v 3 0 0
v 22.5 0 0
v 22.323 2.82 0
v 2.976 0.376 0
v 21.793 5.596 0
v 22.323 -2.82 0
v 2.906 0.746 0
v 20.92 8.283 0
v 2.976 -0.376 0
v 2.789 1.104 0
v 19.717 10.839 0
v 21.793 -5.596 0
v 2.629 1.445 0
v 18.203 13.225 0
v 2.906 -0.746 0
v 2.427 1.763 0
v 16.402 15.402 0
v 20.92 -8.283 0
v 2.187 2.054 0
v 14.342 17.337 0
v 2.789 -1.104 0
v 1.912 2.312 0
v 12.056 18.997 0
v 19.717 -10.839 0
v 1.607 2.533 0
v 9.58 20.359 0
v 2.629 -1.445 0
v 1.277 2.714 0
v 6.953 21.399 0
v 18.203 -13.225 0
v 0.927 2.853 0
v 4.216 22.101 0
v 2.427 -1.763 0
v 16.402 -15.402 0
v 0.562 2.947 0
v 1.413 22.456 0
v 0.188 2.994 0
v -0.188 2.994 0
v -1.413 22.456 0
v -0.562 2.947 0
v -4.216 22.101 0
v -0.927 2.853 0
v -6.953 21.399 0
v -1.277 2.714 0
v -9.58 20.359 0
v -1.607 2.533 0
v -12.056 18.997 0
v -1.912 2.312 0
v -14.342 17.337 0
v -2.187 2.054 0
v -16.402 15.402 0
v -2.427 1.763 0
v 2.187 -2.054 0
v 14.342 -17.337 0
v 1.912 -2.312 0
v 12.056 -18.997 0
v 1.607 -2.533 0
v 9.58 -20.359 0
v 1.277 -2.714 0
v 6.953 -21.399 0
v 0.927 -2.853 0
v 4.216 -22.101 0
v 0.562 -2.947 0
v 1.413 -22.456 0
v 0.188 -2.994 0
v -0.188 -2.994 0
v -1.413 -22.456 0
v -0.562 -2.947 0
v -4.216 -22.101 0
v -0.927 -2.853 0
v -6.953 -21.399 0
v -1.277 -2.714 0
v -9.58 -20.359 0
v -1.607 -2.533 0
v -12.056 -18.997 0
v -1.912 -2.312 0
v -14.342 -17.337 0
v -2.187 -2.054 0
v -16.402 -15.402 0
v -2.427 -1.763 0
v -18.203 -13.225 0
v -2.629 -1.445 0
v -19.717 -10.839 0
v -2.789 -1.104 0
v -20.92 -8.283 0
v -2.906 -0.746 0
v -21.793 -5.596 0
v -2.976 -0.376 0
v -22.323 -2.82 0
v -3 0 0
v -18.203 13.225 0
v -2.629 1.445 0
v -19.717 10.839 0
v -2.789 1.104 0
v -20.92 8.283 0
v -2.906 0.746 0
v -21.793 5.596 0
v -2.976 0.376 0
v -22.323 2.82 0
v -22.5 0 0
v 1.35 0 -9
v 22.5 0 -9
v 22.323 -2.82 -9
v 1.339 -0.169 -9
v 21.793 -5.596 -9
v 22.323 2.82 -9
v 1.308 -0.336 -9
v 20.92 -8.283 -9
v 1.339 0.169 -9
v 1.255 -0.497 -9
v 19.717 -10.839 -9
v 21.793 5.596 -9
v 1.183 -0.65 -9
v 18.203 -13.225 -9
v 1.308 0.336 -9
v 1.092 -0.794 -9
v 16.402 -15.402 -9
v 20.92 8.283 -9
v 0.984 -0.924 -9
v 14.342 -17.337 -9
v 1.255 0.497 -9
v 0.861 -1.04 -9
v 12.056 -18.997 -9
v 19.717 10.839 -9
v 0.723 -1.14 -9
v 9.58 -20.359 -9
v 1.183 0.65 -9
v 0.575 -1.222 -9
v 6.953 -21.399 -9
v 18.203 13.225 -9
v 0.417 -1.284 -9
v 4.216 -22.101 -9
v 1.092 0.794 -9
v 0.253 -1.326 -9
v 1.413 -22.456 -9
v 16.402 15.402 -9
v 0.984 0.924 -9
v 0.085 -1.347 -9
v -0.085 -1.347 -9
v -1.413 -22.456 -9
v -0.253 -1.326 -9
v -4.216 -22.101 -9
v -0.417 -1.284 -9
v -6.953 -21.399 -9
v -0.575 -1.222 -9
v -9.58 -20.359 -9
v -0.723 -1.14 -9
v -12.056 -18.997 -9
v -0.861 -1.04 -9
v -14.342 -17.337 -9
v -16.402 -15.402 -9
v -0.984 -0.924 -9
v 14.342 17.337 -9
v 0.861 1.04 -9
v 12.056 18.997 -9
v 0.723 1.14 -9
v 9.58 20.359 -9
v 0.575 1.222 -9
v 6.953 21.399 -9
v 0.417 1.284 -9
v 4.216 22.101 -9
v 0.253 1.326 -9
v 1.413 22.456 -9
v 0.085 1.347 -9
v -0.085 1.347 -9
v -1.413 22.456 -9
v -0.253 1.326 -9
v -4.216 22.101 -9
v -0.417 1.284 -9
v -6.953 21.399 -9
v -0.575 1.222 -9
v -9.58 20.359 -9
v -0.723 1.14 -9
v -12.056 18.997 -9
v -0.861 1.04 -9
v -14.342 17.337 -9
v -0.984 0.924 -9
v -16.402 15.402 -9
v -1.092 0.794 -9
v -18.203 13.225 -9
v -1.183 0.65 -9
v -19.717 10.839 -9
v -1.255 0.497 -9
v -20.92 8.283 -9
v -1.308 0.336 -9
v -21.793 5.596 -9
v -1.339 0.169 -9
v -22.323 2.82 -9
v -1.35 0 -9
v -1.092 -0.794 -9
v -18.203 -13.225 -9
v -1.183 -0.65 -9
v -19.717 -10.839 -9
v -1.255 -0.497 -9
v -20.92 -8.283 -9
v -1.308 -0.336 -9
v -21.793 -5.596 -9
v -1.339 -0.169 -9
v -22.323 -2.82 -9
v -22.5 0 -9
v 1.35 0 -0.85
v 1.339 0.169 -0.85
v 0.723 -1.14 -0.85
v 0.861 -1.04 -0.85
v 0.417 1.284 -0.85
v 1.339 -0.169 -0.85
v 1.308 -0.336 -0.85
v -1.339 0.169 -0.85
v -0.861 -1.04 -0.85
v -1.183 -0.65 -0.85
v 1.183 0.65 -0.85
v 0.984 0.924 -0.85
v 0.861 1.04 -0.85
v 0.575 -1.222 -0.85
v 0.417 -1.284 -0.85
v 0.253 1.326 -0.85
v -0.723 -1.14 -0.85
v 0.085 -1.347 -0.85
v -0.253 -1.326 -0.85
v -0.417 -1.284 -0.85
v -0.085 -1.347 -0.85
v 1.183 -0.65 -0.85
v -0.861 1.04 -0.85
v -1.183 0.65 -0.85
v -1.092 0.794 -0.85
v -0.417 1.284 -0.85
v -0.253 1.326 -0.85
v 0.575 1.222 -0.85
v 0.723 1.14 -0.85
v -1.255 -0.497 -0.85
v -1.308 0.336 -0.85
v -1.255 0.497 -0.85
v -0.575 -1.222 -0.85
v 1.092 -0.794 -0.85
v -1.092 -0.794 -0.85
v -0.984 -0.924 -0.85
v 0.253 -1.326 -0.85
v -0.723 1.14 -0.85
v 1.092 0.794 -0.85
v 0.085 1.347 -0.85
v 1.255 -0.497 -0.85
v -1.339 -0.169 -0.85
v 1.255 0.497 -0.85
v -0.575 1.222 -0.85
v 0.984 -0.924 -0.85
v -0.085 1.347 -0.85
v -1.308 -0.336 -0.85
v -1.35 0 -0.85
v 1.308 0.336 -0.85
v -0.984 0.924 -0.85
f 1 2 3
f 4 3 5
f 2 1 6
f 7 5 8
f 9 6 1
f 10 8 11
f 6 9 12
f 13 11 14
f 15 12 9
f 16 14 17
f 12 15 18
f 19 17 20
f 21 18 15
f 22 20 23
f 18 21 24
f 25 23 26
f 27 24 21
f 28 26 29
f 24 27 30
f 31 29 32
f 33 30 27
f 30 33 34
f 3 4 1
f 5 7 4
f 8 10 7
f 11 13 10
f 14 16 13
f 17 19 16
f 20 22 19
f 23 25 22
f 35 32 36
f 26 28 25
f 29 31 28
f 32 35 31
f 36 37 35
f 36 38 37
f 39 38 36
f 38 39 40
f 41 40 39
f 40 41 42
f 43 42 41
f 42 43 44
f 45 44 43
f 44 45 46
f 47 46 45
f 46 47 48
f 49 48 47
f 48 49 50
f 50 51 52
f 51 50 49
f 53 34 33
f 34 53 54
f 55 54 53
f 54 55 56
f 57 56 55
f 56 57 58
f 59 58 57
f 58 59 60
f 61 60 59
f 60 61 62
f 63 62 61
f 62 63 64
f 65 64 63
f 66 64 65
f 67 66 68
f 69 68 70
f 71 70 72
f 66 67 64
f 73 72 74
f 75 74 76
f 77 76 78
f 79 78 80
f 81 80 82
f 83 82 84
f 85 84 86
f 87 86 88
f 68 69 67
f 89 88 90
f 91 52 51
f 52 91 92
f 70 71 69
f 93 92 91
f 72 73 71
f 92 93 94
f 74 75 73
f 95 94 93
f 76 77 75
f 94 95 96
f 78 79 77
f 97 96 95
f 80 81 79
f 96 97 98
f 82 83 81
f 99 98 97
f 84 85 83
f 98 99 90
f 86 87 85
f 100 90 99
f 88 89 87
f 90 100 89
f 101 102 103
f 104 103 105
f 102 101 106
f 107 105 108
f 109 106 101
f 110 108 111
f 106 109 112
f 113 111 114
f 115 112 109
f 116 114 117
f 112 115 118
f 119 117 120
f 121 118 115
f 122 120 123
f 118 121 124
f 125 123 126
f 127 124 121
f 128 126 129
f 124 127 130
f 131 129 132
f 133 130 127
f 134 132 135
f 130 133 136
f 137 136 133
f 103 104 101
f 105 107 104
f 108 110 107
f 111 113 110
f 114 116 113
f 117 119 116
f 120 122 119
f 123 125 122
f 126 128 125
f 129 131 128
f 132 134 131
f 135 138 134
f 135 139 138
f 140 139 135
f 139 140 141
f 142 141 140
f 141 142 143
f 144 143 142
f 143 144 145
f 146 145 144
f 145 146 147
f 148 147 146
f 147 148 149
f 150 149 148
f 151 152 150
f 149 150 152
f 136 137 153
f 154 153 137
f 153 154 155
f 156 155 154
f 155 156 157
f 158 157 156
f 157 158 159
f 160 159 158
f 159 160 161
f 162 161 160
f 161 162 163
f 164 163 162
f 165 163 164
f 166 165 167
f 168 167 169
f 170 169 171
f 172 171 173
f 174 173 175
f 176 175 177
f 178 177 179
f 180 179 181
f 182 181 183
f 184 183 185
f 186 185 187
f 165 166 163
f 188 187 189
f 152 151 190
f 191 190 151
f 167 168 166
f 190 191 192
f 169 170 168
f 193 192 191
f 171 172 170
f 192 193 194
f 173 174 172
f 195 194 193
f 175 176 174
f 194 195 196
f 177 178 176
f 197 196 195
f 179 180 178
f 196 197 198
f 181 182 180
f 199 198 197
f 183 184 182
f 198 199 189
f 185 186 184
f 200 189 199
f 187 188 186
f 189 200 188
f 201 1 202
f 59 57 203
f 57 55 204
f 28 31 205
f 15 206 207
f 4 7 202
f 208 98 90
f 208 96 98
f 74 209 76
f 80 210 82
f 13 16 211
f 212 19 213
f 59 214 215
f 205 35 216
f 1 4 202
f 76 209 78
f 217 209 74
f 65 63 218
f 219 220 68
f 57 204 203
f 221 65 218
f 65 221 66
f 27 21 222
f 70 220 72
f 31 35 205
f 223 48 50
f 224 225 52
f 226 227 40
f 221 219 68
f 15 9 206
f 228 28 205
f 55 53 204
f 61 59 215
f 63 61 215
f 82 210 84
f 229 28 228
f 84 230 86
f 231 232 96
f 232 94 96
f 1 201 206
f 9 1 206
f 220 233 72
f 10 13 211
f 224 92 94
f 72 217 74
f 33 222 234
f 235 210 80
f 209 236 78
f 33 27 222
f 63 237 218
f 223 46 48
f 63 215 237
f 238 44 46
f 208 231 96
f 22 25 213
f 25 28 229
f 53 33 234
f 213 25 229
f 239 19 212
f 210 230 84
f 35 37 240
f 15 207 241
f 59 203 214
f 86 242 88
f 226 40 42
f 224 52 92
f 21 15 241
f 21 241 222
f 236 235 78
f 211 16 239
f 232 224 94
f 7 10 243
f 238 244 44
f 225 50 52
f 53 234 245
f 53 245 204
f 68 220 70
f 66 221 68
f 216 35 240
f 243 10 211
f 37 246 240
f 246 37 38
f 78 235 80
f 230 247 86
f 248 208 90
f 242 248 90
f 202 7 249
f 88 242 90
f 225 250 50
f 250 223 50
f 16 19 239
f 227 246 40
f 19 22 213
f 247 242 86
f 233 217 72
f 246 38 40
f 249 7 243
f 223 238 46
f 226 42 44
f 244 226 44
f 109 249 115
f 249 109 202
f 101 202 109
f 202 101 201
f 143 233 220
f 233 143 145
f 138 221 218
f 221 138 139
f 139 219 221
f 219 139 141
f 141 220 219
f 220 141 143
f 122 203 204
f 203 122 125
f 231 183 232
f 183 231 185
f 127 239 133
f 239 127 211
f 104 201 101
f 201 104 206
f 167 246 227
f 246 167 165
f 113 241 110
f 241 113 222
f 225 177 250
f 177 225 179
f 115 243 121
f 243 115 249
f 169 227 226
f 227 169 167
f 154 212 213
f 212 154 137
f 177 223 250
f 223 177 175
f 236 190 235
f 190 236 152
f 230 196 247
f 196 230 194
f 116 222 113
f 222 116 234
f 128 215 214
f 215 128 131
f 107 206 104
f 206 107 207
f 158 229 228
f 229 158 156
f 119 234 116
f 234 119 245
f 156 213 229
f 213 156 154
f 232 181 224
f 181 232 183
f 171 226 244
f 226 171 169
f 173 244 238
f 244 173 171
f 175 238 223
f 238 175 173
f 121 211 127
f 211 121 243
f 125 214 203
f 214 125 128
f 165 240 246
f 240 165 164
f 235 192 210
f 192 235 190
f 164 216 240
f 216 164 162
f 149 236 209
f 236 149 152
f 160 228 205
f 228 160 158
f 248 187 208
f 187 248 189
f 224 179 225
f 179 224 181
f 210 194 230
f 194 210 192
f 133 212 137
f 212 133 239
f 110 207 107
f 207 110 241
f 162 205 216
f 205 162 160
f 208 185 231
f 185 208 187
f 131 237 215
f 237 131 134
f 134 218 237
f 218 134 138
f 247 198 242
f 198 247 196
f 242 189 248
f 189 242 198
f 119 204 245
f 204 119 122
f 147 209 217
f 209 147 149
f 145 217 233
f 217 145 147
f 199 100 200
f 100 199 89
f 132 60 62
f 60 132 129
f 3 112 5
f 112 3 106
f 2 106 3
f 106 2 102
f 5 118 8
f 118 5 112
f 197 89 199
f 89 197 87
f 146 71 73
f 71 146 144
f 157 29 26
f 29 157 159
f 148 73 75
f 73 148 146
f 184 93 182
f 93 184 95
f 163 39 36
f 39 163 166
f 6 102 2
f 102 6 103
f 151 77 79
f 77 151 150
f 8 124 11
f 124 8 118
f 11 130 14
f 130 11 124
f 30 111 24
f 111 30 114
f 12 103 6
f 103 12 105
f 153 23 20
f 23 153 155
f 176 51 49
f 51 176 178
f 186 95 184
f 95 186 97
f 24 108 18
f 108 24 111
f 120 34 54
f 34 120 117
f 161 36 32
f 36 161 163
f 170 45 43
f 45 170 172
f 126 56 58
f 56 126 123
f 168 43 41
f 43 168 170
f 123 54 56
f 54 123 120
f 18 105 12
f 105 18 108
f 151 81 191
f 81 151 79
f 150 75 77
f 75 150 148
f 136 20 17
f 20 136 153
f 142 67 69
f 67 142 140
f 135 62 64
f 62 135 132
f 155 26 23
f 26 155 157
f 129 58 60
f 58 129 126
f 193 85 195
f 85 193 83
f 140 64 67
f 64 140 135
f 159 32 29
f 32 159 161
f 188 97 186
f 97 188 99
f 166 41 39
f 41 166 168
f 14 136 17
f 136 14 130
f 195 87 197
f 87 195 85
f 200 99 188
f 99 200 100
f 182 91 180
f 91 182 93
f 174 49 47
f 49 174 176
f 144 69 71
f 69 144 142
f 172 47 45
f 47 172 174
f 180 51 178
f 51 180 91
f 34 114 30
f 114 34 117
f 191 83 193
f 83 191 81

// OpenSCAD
$fn = 50;


difference() {
	union() {
		translate(v = [0, 0, -9.0000000000]) {
			cylinder(h = 9, r = 22.5000000000);
		}
	}
	union() {
		translate(v = [0, 0, 0]) {
			rotate(a = [0, 0, 0]) {
				difference() {
					union() {
						translate(v = [0, 0, -9.0000000000]) {
							cylinder(h = 9, r = 1.0000000000);
						}
						translate(v = [0, 0, -0.8500000000]) {
							cylinder(h = 0.8500000000, r1 = 1.3500000000, r2 = 3.0000000000);
						}
						translate(v = [0, 0, -9.0000000000]) {
							cylinder(h = 9, r = 1.3500000000);
						}
						translate(v = [0, 0, -9.0000000000]) {
							cylinder(h = 9, r = 1.0000000000);
						}
					}
					union();
				}
			}
		}
	}
}
